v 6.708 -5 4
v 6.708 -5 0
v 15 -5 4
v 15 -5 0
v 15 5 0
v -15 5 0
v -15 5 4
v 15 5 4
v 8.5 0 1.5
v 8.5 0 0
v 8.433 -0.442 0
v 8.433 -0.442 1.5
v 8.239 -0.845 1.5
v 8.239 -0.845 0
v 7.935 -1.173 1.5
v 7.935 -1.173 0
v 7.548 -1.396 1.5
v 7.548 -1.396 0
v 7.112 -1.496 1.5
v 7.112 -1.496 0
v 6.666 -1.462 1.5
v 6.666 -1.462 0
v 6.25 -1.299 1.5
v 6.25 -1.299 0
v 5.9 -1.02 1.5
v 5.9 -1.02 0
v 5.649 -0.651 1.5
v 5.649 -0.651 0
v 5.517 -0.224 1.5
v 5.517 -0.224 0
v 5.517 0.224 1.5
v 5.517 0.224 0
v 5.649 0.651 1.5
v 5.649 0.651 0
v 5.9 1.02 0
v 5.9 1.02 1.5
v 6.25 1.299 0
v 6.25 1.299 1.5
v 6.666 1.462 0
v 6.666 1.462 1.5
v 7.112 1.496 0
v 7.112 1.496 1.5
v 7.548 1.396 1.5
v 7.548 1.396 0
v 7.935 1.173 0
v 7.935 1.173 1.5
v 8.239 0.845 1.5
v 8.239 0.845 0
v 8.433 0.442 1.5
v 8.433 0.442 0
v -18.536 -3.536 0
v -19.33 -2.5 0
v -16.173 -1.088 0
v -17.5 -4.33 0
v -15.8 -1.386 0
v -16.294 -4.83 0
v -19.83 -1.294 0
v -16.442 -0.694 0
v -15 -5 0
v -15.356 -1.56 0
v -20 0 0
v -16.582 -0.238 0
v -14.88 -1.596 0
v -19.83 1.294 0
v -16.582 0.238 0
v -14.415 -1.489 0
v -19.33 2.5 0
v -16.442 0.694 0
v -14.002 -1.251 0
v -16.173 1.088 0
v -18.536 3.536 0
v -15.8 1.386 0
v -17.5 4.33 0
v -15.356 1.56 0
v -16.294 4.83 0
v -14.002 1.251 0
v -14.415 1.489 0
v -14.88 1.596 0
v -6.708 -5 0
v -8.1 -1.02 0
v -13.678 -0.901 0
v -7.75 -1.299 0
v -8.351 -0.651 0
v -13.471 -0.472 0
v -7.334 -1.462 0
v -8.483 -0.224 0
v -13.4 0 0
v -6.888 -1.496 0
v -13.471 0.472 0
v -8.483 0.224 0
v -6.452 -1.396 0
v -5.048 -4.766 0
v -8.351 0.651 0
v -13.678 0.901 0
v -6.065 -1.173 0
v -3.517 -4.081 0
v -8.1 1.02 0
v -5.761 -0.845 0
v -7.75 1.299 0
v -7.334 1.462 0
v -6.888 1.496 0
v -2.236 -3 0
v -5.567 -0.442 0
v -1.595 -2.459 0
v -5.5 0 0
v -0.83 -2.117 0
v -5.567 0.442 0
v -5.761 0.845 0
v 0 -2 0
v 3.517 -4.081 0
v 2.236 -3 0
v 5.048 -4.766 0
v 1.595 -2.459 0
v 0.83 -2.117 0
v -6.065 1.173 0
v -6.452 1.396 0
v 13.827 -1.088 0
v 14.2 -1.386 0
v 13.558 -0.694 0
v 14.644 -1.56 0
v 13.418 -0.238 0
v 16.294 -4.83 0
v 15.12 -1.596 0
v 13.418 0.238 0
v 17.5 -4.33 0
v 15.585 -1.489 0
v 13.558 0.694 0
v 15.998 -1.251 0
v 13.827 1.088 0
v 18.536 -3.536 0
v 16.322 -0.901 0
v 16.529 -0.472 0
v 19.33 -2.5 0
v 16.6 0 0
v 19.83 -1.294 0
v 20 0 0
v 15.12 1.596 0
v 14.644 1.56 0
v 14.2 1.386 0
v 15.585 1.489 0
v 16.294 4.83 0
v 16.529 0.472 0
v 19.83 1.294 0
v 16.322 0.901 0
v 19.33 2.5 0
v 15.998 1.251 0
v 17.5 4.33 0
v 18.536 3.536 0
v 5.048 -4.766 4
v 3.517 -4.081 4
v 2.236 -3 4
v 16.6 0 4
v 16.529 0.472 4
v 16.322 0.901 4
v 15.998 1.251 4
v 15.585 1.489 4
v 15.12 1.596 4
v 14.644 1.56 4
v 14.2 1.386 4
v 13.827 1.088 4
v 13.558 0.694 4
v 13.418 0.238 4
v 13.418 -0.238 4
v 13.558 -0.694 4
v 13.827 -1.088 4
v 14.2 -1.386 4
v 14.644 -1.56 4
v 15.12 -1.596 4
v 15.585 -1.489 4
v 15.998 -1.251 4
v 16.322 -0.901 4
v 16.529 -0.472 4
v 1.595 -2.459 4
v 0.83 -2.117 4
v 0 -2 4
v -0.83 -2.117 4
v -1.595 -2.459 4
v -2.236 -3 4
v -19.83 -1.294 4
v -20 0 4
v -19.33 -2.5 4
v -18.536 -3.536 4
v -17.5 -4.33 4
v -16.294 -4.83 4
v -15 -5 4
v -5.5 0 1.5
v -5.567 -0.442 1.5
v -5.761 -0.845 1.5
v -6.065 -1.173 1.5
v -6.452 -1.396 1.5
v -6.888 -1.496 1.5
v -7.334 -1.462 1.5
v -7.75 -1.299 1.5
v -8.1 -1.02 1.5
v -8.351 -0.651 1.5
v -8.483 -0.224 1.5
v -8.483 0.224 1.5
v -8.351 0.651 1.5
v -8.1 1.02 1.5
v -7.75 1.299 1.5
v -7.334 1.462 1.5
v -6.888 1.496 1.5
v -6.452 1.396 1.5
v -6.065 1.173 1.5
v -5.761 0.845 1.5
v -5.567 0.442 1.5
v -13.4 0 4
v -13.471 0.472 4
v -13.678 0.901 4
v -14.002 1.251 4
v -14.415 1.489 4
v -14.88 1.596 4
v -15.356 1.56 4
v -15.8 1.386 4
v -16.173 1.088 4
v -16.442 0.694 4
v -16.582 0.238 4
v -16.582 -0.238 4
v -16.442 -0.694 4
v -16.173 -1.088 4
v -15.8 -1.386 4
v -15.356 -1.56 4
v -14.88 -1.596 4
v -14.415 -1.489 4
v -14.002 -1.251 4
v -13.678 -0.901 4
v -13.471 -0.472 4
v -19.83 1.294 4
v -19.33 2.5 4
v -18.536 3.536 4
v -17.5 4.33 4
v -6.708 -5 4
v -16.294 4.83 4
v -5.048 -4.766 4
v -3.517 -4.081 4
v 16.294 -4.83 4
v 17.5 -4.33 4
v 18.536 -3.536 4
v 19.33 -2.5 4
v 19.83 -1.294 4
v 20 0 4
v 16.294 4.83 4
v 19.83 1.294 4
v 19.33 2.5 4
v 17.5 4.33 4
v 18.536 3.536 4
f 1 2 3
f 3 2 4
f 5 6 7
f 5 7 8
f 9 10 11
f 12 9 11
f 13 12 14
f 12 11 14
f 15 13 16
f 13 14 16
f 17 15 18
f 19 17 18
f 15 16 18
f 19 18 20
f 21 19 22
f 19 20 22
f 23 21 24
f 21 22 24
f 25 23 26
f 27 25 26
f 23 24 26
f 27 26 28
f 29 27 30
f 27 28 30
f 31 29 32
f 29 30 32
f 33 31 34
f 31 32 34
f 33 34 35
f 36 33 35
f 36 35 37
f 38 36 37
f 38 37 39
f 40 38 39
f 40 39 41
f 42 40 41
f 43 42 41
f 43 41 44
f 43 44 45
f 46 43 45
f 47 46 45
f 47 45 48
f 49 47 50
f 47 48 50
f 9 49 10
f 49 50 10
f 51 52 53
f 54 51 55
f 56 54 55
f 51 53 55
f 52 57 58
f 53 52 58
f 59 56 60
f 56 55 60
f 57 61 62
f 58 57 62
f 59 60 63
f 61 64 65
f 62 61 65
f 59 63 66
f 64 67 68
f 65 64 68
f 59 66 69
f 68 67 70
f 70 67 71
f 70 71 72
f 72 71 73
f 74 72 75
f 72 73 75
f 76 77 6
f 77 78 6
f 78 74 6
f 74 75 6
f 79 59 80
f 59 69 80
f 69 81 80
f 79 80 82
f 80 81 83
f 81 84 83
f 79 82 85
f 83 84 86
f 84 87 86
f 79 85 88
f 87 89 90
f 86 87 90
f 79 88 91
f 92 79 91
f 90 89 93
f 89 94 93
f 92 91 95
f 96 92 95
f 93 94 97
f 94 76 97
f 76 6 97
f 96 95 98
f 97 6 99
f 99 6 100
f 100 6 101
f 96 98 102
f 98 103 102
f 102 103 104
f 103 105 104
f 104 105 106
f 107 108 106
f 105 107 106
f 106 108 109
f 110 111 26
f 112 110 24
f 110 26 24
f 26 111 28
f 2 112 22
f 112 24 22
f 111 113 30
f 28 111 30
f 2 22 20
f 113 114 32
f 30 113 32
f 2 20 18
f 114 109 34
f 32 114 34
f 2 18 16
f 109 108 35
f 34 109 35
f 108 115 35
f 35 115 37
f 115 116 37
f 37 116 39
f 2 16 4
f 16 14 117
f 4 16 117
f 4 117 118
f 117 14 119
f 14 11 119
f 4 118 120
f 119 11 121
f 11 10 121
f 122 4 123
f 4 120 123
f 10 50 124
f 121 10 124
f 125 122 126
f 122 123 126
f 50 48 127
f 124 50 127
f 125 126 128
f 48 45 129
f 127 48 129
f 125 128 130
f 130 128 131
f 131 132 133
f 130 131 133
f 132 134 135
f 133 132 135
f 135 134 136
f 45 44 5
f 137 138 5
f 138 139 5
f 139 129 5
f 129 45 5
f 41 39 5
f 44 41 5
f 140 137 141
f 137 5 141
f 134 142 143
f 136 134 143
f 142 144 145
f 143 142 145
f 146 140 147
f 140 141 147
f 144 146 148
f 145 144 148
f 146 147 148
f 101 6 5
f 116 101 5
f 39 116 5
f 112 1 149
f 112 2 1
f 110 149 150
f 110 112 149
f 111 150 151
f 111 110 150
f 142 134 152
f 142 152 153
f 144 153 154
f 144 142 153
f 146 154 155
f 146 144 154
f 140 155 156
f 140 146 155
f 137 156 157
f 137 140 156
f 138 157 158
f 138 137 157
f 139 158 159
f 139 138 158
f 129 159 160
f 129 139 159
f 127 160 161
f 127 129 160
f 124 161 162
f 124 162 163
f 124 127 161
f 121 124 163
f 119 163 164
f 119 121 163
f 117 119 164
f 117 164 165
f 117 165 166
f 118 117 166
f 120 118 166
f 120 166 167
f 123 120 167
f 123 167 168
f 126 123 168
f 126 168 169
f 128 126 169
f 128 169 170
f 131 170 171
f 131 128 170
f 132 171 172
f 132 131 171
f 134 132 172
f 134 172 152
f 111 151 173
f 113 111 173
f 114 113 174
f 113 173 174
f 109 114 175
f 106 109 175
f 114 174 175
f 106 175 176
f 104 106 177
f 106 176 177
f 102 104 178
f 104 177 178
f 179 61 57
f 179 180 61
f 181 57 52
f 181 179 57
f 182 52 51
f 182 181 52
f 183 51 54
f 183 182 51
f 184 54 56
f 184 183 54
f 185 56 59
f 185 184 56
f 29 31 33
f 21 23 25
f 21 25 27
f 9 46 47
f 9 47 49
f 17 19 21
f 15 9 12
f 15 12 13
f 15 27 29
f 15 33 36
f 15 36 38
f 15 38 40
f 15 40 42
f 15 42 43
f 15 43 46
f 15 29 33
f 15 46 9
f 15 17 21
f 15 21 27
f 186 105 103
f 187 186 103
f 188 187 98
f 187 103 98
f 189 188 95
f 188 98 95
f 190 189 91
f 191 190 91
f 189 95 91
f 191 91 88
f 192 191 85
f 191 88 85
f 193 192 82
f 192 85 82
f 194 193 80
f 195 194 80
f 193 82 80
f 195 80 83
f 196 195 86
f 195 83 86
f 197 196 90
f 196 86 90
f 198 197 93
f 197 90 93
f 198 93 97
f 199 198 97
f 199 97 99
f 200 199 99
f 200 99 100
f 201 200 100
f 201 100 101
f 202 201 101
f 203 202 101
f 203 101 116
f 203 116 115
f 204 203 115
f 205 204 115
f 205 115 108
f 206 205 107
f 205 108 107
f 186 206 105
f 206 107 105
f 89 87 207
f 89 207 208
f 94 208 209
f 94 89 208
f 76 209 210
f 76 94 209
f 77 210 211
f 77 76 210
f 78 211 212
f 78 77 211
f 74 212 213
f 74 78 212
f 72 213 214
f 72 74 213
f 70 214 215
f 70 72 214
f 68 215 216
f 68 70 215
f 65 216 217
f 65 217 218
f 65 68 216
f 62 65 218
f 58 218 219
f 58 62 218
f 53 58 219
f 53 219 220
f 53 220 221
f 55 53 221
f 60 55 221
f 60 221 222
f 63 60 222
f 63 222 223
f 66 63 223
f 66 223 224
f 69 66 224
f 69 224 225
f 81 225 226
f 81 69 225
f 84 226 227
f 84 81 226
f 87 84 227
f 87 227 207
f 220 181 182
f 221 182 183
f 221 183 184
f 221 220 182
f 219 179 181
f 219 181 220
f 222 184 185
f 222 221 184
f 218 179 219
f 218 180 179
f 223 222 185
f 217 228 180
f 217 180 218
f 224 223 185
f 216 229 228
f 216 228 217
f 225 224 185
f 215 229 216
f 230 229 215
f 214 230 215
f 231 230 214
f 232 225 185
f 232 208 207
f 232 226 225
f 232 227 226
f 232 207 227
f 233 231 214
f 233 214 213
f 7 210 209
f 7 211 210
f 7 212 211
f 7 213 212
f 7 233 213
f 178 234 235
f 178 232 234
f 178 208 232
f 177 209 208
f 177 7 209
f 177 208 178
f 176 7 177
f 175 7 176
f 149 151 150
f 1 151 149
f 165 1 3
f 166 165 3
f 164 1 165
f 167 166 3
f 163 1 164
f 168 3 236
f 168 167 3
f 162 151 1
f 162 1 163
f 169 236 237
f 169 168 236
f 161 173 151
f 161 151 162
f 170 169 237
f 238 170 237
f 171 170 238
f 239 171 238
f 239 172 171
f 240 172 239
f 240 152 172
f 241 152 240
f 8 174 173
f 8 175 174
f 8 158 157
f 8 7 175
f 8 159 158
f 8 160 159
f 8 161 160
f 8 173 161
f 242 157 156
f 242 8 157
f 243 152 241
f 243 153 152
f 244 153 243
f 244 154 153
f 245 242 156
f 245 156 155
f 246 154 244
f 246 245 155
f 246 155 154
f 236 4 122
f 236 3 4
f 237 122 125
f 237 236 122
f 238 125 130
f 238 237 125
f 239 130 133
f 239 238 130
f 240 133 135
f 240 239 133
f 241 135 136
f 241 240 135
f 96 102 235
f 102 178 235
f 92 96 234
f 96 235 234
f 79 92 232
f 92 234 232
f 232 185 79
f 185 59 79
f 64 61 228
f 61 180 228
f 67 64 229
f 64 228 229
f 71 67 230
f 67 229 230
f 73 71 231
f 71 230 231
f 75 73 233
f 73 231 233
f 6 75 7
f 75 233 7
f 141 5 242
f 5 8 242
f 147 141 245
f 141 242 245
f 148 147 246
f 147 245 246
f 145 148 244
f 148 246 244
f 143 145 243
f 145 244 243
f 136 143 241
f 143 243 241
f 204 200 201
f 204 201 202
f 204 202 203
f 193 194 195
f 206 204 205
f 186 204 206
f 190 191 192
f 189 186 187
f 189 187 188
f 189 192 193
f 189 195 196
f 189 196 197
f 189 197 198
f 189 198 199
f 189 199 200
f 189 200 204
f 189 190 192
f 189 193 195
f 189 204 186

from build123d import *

# Parameters (mm, degrees)
F0_W     = 40
F0_H     = 10
F0_R     = 1.6
F1_DEPTH = 4
F2_R     = 1.5
F3_DEPTH = 1.5
F4_R     = 4.99999
F5_R     = 3
F6_DEPTH = 25
F7_R     = 6


# Not quite as in the source:
# - a fillet or chamfer is up to 0.001 mm smaller than in the source, because OpenCascade refuses the exact size


with BuildPart() as f1:
    # F0 (on Top) → F1 (new body)
    with BuildSketch(Plane.XY):
        Rectangle(F0_W, F0_H)
        with Locations((-15, 0)):
            Circle(F0_R, mode=Mode.SUBTRACT)
        with Locations((15, 0)):
            Circle(F0_R, mode=Mode.SUBTRACT)
    extrude(amount=F1_DEPTH)

    # F2 (on face) → F3 (cut)
    with BuildSketch(Plane(origin=(0, 0, 0), x_dir=(1, 0, 0), z_dir=(0, 0, -1))):
        with Locations((-7, 0)):
            Circle(F2_R)
        with Locations((7, 0)):
            Circle(F2_R)
    extrude(amount=-F3_DEPTH, mode=Mode.SUBTRACT)

    # F4 (radius 5 in the source; OpenCascade refuses exactly that, so slightly less here)
    f4_edges = [f1.edges().sort_by_distance(p)[0] for p in [
        (-20, -5, 2),
        (-20, 5, 2),
        (20, 5, 2),
        (20, -5, 2),
    ]]
    fillet(f4_edges, radius=F4_R)

    # F5 (on face) → F6 (cut)
    with BuildSketch(Plane.XY.offset(4)):
        with Locations((0, -5)):
            Circle(F5_R)
    extrude(amount=-F6_DEPTH, mode=Mode.SUBTRACT)

    # F7
    f7_edges = [f1.edges().sort_by_distance(p)[0] for p in [
        (3, -5, 2),
        (-3, -5, 2),
    ]]
    fillet(f7_edges, radius=F7_R)


solid = f1.part
